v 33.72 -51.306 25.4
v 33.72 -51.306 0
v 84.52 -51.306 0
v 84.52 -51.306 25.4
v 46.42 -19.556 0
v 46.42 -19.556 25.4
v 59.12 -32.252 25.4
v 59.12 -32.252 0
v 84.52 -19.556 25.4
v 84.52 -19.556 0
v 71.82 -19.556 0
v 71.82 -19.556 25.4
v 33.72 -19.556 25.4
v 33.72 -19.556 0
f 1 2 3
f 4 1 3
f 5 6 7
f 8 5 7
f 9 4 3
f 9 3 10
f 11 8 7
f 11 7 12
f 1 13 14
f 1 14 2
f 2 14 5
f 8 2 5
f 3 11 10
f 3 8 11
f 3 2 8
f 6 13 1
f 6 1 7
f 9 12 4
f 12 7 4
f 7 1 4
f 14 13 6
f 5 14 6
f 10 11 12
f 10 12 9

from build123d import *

# Parameters (mm, degrees)
F0_W     = 50.8
F0_H     = 6.35
F1_DEPTH = 25.4
F3_DEPTH = 25.4
F5_DEPTH = 25.4
F7_DEPTH = 25.4


with BuildPart() as f1:
    # F0 (on Top) → F1 (new body)
    with BuildSketch(Plane.XY):
        with Locations((59.120102, -48.131117)):
            Rectangle(F0_W, F0_H)
    extrude(amount=F1_DEPTH)

    # F2 (on face) → F3 (join)
    with BuildSketch(Plane.XY.offset(25.4)):
        Polygon((59.120102, -44.956117), (84.520102, -44.956117), (84.520102, -19.556117), align=None)
    extrude(amount=-F3_DEPTH)

    # F4 (on face) → F5 (join)
    with BuildSketch(Plane.XY.offset(25.4)):
        Polygon((33.720102, -19.556117), (33.720102, -44.956117), (59.120102, -44.956117), align=None)
    extrude(amount=-F5_DEPTH)

    # F6 (on face) → F7 (join)
    with BuildSketch(Plane(origin=(0, 0, 0), x_dir=(1, 0, 0), z_dir=(0, 0, -1))):
        Polygon((71.820102, 19.556117), (84.520102, 19.556117), (59.120102, 44.956117), (33.720102, 19.556117), (46.420102, 19.556117), (59.120102, 32.252281), align=None)
    extrude(amount=-F7_DEPTH)


solid = f1.part
